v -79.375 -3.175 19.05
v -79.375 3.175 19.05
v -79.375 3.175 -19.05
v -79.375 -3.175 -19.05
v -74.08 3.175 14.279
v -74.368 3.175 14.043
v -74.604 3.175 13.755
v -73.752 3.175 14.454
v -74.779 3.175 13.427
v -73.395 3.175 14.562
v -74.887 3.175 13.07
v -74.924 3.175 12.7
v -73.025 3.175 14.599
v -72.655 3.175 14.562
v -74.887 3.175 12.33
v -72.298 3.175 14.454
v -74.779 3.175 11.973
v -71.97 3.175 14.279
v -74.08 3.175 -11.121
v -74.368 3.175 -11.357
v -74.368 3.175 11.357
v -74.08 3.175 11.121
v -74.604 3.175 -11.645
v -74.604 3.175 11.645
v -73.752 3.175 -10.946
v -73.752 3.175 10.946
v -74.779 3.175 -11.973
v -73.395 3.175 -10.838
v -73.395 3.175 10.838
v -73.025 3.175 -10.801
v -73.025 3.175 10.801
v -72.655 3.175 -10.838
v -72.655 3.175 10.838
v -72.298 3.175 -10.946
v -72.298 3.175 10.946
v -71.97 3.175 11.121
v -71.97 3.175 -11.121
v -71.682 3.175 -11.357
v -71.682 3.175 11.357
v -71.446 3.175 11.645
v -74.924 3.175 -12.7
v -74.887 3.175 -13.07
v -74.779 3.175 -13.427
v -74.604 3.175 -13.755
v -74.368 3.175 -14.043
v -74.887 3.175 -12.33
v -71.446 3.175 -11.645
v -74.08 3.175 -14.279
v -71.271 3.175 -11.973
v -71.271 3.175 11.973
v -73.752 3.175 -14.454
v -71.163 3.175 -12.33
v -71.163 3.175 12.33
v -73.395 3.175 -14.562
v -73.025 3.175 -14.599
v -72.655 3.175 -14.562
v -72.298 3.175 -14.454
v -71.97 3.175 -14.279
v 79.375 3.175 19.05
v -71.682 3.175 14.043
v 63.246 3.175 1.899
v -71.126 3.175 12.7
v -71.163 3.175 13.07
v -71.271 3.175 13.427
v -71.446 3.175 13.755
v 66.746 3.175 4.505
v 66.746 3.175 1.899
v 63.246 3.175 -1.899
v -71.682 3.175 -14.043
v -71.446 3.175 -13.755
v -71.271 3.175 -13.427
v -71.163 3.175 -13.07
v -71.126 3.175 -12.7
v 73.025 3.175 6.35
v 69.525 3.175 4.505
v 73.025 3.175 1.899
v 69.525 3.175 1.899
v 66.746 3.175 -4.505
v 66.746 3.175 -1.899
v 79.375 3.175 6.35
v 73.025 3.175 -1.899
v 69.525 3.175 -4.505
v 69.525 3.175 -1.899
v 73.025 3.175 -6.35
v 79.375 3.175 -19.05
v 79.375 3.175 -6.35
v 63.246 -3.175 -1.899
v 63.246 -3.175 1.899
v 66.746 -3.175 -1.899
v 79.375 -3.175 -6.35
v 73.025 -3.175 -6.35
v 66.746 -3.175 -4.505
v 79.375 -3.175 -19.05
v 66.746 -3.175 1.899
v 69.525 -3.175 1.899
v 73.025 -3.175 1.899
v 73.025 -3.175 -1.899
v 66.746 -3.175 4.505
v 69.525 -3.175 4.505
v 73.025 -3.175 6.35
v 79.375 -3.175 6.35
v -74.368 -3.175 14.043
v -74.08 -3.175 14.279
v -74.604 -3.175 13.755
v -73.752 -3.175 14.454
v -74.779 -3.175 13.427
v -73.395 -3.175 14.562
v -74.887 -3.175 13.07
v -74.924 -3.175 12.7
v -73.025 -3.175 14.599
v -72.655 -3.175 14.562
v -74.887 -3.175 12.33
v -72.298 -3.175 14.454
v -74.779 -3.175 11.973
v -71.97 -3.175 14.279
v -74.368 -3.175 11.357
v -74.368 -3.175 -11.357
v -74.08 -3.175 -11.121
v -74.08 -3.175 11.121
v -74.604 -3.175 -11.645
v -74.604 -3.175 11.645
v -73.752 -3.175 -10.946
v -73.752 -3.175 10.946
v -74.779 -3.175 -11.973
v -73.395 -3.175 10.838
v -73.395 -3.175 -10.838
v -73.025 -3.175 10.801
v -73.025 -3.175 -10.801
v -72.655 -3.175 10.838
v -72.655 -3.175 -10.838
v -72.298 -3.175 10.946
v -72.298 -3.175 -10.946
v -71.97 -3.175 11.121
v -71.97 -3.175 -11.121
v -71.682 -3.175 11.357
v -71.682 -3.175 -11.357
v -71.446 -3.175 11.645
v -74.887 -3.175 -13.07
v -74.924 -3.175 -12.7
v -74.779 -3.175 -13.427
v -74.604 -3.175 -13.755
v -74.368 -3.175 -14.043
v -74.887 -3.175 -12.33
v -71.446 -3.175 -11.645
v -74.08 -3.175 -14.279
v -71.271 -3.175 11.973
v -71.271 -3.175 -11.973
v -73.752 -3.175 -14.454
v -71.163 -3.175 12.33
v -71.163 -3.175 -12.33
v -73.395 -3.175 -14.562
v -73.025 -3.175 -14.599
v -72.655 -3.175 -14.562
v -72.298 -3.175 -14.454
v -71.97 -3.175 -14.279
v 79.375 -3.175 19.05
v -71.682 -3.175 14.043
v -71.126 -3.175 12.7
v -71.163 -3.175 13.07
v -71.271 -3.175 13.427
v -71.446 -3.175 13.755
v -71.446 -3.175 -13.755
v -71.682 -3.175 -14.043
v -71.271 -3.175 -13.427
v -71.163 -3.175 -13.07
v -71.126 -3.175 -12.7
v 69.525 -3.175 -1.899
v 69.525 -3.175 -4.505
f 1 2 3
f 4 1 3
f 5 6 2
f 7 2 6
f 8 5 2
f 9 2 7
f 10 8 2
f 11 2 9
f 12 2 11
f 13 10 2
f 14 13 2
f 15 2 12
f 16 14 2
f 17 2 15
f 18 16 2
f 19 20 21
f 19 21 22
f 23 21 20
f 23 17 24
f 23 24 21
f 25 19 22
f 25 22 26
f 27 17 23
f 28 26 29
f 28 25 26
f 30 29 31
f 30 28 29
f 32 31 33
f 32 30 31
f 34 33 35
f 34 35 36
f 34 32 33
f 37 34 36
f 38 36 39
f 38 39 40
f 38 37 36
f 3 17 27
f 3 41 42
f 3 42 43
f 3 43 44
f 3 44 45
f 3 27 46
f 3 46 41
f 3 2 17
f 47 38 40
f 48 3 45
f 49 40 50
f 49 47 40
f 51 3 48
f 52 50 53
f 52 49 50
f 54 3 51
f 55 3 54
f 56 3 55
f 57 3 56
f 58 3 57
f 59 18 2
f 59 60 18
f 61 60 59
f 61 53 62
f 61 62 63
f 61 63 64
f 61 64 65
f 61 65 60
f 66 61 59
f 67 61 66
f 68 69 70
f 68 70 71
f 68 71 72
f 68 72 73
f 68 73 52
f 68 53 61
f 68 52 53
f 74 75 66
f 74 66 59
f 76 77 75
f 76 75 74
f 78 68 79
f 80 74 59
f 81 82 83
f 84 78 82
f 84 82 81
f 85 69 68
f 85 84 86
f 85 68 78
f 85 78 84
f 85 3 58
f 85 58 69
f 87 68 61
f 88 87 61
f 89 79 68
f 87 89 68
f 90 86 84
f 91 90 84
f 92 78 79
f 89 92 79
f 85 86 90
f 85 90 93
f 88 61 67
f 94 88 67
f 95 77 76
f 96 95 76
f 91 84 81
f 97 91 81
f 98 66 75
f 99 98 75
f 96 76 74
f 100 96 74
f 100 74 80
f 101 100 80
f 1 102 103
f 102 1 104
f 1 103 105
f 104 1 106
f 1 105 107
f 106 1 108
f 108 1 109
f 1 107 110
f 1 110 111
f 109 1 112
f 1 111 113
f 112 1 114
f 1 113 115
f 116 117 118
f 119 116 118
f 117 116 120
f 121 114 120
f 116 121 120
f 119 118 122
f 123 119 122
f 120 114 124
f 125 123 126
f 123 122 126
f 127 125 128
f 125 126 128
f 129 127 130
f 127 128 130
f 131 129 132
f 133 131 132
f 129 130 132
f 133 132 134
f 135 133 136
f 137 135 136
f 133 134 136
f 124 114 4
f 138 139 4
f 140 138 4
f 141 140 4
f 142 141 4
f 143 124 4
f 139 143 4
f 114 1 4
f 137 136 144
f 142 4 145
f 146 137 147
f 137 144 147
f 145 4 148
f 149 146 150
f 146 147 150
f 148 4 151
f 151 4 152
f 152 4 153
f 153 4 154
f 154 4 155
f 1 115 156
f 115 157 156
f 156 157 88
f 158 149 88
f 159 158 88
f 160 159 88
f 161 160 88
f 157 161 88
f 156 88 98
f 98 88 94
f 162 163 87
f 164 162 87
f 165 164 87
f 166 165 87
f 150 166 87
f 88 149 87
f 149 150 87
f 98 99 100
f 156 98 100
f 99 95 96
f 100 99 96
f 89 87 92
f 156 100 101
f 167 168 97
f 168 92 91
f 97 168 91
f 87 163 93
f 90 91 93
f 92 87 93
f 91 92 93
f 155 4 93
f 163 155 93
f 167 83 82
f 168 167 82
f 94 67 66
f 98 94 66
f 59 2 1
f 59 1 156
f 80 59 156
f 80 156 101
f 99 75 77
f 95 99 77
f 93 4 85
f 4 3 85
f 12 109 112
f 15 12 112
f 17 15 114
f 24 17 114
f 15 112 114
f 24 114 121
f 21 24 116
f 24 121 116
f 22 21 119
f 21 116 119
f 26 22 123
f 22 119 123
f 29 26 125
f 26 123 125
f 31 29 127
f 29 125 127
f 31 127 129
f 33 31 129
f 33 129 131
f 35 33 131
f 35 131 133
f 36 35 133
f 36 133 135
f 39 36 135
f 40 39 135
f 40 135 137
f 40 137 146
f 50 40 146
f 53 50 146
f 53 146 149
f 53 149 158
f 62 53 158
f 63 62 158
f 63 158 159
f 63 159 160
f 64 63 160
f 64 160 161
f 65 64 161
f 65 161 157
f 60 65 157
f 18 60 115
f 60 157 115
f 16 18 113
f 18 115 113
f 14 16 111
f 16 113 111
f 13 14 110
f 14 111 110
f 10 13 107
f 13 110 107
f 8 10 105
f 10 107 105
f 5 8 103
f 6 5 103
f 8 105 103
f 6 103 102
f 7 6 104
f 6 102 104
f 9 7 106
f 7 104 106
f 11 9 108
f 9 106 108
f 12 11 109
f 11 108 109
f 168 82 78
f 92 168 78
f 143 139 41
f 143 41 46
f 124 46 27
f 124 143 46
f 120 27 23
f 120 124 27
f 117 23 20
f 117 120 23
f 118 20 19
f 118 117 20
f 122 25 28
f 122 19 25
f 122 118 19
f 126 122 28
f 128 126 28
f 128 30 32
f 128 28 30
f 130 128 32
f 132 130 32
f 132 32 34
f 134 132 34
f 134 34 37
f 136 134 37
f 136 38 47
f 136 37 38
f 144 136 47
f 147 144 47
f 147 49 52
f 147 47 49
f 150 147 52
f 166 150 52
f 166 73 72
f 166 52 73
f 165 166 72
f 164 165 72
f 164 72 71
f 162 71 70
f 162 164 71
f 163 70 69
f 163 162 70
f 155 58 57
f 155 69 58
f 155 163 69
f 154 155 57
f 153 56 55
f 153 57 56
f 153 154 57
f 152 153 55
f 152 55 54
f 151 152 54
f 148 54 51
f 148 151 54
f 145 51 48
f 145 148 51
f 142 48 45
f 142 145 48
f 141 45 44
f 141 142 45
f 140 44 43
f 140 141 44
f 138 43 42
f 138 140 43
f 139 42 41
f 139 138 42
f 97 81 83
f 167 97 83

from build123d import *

# Parameters (mm, degrees)
SKETCH1_W             = 158.75
SKETCH1_H             = 38.1
BOSS_EXTRUDE1_DEPTH   = 3.175
CUT_EXTRUDE1_REACH    = 83.876
F_6_CLEARANCE_HOLE1_D = 3.7973


with BuildPart() as part:
    # Sketch1 → Boss-Extrude1 (new, symmetric)
    with BuildSketch(Plane(origin=(0, 0, 0), x_dir=(1, 0, 0), z_dir=(0, 1, 0))):
        Rectangle(SKETCH1_W, SKETCH1_H)
    extrude(amount=BOSS_EXTRUDE1_DEPTH, both=True)

    # Sketch2 → Cut-Extrude1 (cut, up to next)
    with BuildSketch(Plane(origin=(0, 3.175, 0), x_dir=(1, 0, 0), z_dir=(0, 1, 0)), mode=Mode.PRIVATE) as cut_extrude1_sk1:
        Polygon((79.375, -6.35), (79.375, 6.35), (73.025, 6.35), (73.025, 1.89865), (69.524626, 1.89865), (69.524626, 4.504546622), (66.746374, 4.504546622), (66.746374, 1.89865), (63.246, 1.89865), (63.246, -1.89865), (66.746374, -1.89865), (66.746374, -4.504546622), (69.524626, -4.504546622), (69.524626, -1.89865), (73.025, -1.89865), (73.025, -6.35), align=None)
    cut_extrude1_tool1 = extrude(cut_extrude1_sk1.sketch, amount=-CUT_EXTRUDE1_REACH, mode=Mode.PRIVATE) & part.part
    add(cut_extrude1_tool1.solids().sort_by_distance((73.052853, 3.175, 0))[0], mode=Mode.SUBTRACT)

    # #6 Clearance Hole1 (through all)
    with Locations(Plane(origin=(0, 3.175, 0), x_dir=(1, 0, 0), z_dir=(0, 1, 0))):
        with Locations((-73.025, -12.7)):
            f_6_clearance_hole1 = Hole(F_6_CLEARANCE_HOLE1_D / 2)

    # Mirror1: #6 Clearance Hole1 across plane
    add(f_6_clearance_hole1.mirror(Plane.XY), mode=Mode.SUBTRACT)


solid = part.part
